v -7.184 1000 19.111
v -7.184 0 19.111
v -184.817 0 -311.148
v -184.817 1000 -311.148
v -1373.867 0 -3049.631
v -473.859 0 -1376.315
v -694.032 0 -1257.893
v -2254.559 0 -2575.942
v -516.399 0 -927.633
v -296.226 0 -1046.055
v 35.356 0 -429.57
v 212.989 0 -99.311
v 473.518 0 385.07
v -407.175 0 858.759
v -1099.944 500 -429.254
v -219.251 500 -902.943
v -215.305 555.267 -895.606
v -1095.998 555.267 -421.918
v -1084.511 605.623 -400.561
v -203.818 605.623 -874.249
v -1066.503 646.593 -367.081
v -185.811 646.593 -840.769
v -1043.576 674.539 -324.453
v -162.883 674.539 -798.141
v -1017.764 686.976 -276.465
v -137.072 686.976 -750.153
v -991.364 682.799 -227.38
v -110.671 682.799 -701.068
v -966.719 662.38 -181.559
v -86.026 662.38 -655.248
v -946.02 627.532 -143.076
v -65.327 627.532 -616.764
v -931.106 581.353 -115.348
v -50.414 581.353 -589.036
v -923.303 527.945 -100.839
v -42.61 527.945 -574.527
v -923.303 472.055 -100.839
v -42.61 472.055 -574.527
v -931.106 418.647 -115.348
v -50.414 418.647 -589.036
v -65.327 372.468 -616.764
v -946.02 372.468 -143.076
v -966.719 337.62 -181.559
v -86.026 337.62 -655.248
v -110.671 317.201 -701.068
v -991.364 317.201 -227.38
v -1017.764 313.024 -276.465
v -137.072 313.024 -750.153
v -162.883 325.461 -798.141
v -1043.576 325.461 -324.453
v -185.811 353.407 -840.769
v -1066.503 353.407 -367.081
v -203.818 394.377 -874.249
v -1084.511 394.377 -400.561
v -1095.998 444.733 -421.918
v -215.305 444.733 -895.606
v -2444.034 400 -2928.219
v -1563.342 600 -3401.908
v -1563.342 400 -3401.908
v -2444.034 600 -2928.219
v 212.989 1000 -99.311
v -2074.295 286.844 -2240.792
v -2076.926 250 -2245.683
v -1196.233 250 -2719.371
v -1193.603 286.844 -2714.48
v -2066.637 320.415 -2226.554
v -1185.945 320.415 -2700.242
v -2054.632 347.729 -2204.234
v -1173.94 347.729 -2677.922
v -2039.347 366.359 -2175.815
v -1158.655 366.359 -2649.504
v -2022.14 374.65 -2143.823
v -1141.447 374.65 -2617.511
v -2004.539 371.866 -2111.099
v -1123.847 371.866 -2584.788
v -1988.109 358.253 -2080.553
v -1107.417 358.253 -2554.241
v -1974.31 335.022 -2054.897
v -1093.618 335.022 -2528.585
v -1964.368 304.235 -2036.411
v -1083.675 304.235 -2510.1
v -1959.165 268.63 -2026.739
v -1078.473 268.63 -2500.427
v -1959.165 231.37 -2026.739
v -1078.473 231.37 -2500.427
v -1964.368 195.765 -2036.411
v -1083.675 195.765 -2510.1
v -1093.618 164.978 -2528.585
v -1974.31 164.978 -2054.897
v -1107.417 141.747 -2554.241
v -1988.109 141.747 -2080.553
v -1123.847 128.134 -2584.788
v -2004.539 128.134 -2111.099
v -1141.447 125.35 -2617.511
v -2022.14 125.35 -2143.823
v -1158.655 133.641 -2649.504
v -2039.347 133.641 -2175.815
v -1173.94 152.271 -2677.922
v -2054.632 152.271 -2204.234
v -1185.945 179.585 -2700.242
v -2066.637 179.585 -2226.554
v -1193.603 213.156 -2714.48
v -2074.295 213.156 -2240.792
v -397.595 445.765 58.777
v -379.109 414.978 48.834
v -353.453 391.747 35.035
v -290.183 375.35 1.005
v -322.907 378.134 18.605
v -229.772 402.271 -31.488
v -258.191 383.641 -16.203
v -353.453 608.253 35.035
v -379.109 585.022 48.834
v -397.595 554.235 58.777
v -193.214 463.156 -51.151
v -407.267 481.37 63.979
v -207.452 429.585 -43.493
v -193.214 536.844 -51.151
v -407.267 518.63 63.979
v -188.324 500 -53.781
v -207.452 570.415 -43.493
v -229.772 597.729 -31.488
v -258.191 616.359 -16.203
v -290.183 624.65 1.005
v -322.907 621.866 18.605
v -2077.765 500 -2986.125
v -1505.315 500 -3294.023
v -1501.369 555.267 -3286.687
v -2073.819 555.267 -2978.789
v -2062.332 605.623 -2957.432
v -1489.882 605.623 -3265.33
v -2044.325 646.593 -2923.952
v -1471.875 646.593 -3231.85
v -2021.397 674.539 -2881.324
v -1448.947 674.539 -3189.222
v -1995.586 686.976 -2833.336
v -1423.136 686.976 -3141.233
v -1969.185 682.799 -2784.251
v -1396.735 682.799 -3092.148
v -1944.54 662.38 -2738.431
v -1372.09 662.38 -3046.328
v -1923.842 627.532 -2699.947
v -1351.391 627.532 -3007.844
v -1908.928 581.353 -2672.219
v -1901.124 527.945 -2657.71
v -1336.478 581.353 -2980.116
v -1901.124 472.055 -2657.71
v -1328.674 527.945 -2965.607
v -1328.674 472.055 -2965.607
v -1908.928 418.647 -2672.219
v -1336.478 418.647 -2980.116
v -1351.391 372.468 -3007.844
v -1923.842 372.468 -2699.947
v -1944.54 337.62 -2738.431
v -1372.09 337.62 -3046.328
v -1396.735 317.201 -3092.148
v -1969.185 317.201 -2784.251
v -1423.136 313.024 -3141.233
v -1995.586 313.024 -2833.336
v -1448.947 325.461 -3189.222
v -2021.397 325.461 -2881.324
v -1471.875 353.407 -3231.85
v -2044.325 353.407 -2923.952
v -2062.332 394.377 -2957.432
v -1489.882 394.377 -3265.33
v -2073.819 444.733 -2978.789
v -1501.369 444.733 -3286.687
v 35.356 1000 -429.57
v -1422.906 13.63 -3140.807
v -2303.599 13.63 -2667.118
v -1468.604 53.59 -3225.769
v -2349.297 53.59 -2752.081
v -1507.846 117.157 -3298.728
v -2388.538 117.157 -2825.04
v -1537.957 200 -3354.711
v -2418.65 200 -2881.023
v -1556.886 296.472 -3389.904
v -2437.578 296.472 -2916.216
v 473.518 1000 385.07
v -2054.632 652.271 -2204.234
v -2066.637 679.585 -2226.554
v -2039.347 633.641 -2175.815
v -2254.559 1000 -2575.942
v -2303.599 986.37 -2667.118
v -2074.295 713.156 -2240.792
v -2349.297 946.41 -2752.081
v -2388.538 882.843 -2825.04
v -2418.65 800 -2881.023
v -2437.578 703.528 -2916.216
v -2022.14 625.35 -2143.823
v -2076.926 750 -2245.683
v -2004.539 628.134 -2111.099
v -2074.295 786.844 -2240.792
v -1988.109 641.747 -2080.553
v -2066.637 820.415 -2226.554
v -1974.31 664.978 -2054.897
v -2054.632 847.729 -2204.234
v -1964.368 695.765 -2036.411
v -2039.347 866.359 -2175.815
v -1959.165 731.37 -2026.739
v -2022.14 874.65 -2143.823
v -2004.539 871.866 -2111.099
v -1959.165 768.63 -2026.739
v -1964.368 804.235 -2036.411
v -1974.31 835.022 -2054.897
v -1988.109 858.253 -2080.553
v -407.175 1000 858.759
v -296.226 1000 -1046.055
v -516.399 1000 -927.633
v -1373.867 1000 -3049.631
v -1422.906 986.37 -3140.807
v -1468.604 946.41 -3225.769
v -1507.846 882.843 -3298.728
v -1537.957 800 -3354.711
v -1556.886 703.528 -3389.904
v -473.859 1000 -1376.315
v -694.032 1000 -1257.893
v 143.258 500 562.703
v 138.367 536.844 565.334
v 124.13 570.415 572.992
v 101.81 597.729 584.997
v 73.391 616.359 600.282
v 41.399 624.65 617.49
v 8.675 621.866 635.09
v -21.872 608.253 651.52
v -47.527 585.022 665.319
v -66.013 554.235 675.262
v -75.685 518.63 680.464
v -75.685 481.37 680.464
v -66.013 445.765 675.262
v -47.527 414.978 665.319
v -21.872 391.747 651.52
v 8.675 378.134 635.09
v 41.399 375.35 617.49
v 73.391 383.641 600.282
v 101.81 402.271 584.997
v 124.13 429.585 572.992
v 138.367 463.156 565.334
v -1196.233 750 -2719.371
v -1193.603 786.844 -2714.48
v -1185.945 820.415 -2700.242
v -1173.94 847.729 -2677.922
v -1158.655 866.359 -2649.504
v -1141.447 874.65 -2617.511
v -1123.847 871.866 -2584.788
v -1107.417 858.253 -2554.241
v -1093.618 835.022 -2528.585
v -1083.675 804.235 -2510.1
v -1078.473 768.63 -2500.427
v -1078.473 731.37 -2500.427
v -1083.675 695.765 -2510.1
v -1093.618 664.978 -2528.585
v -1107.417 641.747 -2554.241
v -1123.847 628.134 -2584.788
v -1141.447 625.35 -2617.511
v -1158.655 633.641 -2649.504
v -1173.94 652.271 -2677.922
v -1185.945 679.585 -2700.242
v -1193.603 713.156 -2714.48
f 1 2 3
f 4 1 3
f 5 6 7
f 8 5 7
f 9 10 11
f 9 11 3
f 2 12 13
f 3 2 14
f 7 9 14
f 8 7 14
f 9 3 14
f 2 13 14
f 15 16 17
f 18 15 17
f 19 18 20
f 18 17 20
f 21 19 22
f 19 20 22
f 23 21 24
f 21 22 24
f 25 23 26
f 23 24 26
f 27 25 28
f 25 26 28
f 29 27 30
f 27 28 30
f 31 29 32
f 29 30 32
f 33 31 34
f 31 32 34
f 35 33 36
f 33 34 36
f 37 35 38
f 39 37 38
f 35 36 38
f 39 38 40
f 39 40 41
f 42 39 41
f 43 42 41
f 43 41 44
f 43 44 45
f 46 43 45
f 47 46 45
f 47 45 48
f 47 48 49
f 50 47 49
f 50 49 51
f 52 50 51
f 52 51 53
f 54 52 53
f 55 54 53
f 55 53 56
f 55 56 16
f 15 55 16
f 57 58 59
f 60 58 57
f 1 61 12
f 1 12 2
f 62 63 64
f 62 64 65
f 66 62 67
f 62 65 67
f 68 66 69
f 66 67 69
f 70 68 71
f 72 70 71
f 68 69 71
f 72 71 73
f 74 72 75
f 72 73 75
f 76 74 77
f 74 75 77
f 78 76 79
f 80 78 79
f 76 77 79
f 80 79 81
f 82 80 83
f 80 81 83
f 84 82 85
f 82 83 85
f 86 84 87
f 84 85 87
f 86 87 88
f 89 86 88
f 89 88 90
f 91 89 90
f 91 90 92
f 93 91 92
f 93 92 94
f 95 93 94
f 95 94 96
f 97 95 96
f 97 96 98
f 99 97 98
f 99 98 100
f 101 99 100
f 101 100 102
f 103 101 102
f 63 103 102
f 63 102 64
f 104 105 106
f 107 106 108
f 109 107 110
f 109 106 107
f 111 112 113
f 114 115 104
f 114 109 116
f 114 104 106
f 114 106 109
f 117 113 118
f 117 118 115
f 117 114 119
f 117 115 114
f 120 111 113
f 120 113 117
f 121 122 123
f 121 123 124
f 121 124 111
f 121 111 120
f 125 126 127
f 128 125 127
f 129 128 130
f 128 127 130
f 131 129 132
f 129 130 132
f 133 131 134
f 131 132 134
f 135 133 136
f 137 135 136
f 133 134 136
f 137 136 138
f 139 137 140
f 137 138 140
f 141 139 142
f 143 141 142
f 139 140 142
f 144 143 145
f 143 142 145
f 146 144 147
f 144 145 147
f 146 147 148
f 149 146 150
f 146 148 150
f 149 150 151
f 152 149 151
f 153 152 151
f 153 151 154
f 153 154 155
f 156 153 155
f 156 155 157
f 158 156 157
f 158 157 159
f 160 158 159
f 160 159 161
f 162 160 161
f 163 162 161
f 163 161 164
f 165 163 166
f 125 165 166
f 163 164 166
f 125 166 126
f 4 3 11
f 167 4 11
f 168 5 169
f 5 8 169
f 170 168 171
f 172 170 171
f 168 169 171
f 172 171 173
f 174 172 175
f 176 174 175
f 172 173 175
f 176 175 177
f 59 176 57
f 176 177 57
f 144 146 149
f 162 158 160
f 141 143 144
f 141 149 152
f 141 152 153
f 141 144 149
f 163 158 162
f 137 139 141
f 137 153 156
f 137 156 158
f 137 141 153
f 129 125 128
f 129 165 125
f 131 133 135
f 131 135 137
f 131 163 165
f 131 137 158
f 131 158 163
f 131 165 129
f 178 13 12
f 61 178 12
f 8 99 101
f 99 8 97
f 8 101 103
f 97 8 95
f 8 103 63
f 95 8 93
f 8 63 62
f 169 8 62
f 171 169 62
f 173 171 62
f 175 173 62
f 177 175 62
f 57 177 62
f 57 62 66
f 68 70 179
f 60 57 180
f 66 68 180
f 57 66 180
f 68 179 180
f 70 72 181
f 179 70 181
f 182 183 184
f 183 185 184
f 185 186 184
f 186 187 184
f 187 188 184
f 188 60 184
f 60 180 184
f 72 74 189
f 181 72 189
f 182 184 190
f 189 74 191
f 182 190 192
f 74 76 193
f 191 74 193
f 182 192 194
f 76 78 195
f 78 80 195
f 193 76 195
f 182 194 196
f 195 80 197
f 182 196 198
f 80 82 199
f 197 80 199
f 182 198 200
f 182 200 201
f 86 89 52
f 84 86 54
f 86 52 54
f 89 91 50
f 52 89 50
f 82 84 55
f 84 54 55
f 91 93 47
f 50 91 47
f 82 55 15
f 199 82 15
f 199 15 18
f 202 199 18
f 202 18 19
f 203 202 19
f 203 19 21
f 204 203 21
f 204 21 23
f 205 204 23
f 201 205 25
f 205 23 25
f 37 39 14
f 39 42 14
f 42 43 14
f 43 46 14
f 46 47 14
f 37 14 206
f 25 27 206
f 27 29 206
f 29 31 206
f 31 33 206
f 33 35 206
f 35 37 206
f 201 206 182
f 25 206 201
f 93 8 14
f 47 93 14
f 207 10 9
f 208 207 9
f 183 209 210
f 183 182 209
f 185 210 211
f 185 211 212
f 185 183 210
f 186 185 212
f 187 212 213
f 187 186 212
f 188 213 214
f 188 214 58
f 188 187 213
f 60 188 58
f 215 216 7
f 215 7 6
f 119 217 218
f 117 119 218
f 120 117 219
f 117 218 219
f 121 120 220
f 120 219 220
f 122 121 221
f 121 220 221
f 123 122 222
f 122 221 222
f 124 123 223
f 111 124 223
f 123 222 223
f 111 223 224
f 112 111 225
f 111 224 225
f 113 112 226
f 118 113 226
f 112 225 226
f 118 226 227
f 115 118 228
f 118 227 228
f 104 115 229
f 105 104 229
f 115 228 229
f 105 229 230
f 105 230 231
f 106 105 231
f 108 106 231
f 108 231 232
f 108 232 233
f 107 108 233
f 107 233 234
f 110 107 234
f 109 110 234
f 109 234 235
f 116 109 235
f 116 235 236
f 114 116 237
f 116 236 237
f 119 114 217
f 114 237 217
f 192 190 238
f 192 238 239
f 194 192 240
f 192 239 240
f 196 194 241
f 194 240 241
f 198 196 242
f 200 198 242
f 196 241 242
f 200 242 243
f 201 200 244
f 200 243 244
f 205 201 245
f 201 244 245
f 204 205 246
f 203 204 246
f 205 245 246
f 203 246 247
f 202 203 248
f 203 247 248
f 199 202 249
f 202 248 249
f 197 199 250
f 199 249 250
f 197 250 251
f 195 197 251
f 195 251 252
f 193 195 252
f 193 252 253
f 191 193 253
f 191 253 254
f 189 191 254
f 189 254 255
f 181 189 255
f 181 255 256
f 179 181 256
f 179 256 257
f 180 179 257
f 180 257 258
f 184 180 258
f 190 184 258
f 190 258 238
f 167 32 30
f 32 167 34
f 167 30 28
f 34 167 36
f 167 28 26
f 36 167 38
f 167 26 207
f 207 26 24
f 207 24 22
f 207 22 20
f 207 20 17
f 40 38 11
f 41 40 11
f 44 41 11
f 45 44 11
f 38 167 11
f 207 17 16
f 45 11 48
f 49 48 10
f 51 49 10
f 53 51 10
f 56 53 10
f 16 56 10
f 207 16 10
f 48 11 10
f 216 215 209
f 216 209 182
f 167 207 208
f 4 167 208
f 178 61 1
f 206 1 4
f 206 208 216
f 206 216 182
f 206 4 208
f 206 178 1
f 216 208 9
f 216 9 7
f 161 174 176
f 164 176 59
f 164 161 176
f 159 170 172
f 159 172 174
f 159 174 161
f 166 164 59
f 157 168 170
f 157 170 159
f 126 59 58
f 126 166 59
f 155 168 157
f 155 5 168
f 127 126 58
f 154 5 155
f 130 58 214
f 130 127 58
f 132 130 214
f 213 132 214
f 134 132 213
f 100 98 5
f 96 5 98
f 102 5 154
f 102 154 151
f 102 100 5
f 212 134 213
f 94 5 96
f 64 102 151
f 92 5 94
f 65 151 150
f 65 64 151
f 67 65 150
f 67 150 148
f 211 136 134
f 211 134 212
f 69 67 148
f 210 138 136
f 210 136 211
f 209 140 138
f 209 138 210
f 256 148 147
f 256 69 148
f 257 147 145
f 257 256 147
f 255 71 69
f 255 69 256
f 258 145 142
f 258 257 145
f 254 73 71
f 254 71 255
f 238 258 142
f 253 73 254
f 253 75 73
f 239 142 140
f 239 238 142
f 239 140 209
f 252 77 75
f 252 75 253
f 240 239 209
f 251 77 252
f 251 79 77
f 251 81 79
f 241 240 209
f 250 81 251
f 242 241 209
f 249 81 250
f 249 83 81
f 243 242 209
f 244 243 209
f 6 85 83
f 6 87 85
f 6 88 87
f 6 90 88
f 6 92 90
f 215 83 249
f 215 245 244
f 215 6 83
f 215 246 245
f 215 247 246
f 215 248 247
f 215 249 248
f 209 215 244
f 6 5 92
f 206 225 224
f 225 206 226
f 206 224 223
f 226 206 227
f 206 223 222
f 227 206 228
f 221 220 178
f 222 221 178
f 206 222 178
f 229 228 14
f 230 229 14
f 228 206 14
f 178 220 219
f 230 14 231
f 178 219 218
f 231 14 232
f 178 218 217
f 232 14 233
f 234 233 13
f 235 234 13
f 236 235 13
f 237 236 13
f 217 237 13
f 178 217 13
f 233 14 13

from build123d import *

# Parameters (mm, degrees)
BOSS_EXTRUDE1_DEPTH = 1000
CUT_EXTRUDE2_REACH  = 4048.723
SKETCH2_R           = 187.5
SKETCH5_W           = 1000
SKETCH5_H           = 1000
BOSS_EXTRUDE2_DEPTH = 310
FILLET1_R           = 400
SKETCH6_R           = 187.5
CUT_EXTRUDE3_DEPTH  = 650
CUT_EXTRUDE4_REACH  = 4344.256
SKETCH7_R           = 125
SKETCH8_R           = 125
CUT_EXTRUDE5_DEPTH  = 700


with BuildPart() as part:
    # Sketch1 → Boss-Extrude1 (new body)
    with BuildSketch(Plane(origin=(0, 0, 0), x_dir=(1, 0, 0), z_dir=(0, 1, 0))):
        Polygon((473.518002347, -385.070267513), (212.989409896, 99.310628596), (-7.183724699, -19.111458882), (-184.816855916, 311.148243011), (35.356278679, 429.570330489), (-296.225566259, 1046.055107355), (-516.398700854, 927.633019877), (-694.031832071, 1257.892721769), (-473.858697476, 1376.314809247), (-1416.4985138, 3128.892960623), (-2297.19105218, 2655.204610711), (-407.174536033, -858.758617424), align=None)
    extrude(amount=BOSS_EXTRUDE1_DEPTH)

    # Sketch2 → Cut-Extrude2 (cut, up to next)
    with BuildSketch(Plane(origin=(206.628498898, 0, -111.13698416), x_dir=(-0.47368834991159353, 0, -0.8806925383799001), z_dir=(0.8806925383799001, 0, -0.47368834991159353)), mode=Mode.PRIVATE) as cut_extrude2_sk1:
        with Locations((711.571527464, 500)):
            Circle(SKETCH2_R)
    cut_extrude2_tool1 = extrude(cut_extrude2_sk1.sketch, amount=-CUT_EXTRUDE2_REACH, mode=Mode.PRIVATE) & part.part
    add(cut_extrude2_tool1.solids().sort_by_distance((-130.434644, 500, -737.812719))[0], mode=Mode.SUBTRACT)

    # Sketch5 → Boss-Extrude2 (add)
    with BuildSketch(Plane(origin=(-1623.127012699, 0, -3017.755976463), x_dir=(-0.8806925383799005, 0, 0.4736883499115927), z_dir=(-0.4736883499115927, 0, -0.8806925383799005))):
        with Locations((265.379528163, 500)):
            Rectangle(SKETCH5_W, SKETCH5_H)
    extrude(amount=BOSS_EXTRUDE2_DEPTH)

    # Fillet1
    fillet1_edges = [part.edges().sort_by_distance(p)[0] for p in [
        (-2003.688171463, 0, -3165.063472565),
        (-2003.688171463, 1000, -3165.063472565),
    ]]
    fillet(fillet1_edges, radius=FILLET1_R)

    # Sketch6 → Cut-Extrude3 (cut)
    with BuildSketch(Plane(origin=(206.628498898, 0, -111.13698416), x_dir=(-0.4736883499115939, 0, -0.8806925383798999), z_dir=(0.8806925383798999, 0, -0.4736883499115939))):
        with Locations((3426.571527464, 500)):
            Circle(SKETCH6_R)
    extrude(amount=-CUT_EXTRUDE3_DEPTH, mode=Mode.SUBTRACT)

    # Sketch7 → Cut-Extrude4 (cut, up to next)
    with BuildSketch(Plane(origin=(206.628498898, 0, -111.13698416), x_dir=(-0.4736883499115939, 0, -0.8806925383798999), z_dir=(0.8806925383798999, 0, -0.4736883499115939)), mode=Mode.PRIVATE) as cut_extrude4_sk1:
        with Locations((2836.571527464, 750)):
            Circle(SKETCH7_R)
    cut_extrude4_tool1 = extrude(cut_extrude4_sk1.sketch, amount=-CUT_EXTRUDE4_REACH, mode=Mode.PRIVATE) & part.part
    # Sketch7 → Cut-Extrude4 (cut, up to next)
    with BuildSketch(Plane(origin=(206.628498898, 0, -111.13698416), x_dir=(-0.4736883499115939, 0, -0.8806925383798999), z_dir=(0.8806925383798999, 0, -0.4736883499115939)), mode=Mode.PRIVATE) as cut_extrude4_sk2:
        with Locations((2836.571527464, 250)):
            Circle(SKETCH7_R)
    cut_extrude4_tool2 = extrude(cut_extrude4_sk2.sketch, amount=-CUT_EXTRUDE4_REACH, mode=Mode.PRIVATE) & part.part
    add(cut_extrude4_tool1.solids().sort_by_distance((-1137.022387, 750, -2609.284363))[0], mode=Mode.SUBTRACT)
    add(cut_extrude4_tool2.solids().sort_by_distance((-1137.022387, 250, -2609.284363))[0], mode=Mode.SUBTRACT)

    # Sketch8 → Cut-Extrude5 (cut)
    with BuildSketch(Plane(origin=(266.889503449, 0, 496.207251673), x_dir=(0.8806925383799001, 0, -0.4736883499115936), z_dir=(0.4736883499115936, 0, 0.8806925383799001))):
        with Locations((-265.379528163, 500)):
            Circle(SKETCH8_R)
    extrude(amount=-CUT_EXTRUDE5_DEPTH, mode=Mode.SUBTRACT)


solid = part.part
